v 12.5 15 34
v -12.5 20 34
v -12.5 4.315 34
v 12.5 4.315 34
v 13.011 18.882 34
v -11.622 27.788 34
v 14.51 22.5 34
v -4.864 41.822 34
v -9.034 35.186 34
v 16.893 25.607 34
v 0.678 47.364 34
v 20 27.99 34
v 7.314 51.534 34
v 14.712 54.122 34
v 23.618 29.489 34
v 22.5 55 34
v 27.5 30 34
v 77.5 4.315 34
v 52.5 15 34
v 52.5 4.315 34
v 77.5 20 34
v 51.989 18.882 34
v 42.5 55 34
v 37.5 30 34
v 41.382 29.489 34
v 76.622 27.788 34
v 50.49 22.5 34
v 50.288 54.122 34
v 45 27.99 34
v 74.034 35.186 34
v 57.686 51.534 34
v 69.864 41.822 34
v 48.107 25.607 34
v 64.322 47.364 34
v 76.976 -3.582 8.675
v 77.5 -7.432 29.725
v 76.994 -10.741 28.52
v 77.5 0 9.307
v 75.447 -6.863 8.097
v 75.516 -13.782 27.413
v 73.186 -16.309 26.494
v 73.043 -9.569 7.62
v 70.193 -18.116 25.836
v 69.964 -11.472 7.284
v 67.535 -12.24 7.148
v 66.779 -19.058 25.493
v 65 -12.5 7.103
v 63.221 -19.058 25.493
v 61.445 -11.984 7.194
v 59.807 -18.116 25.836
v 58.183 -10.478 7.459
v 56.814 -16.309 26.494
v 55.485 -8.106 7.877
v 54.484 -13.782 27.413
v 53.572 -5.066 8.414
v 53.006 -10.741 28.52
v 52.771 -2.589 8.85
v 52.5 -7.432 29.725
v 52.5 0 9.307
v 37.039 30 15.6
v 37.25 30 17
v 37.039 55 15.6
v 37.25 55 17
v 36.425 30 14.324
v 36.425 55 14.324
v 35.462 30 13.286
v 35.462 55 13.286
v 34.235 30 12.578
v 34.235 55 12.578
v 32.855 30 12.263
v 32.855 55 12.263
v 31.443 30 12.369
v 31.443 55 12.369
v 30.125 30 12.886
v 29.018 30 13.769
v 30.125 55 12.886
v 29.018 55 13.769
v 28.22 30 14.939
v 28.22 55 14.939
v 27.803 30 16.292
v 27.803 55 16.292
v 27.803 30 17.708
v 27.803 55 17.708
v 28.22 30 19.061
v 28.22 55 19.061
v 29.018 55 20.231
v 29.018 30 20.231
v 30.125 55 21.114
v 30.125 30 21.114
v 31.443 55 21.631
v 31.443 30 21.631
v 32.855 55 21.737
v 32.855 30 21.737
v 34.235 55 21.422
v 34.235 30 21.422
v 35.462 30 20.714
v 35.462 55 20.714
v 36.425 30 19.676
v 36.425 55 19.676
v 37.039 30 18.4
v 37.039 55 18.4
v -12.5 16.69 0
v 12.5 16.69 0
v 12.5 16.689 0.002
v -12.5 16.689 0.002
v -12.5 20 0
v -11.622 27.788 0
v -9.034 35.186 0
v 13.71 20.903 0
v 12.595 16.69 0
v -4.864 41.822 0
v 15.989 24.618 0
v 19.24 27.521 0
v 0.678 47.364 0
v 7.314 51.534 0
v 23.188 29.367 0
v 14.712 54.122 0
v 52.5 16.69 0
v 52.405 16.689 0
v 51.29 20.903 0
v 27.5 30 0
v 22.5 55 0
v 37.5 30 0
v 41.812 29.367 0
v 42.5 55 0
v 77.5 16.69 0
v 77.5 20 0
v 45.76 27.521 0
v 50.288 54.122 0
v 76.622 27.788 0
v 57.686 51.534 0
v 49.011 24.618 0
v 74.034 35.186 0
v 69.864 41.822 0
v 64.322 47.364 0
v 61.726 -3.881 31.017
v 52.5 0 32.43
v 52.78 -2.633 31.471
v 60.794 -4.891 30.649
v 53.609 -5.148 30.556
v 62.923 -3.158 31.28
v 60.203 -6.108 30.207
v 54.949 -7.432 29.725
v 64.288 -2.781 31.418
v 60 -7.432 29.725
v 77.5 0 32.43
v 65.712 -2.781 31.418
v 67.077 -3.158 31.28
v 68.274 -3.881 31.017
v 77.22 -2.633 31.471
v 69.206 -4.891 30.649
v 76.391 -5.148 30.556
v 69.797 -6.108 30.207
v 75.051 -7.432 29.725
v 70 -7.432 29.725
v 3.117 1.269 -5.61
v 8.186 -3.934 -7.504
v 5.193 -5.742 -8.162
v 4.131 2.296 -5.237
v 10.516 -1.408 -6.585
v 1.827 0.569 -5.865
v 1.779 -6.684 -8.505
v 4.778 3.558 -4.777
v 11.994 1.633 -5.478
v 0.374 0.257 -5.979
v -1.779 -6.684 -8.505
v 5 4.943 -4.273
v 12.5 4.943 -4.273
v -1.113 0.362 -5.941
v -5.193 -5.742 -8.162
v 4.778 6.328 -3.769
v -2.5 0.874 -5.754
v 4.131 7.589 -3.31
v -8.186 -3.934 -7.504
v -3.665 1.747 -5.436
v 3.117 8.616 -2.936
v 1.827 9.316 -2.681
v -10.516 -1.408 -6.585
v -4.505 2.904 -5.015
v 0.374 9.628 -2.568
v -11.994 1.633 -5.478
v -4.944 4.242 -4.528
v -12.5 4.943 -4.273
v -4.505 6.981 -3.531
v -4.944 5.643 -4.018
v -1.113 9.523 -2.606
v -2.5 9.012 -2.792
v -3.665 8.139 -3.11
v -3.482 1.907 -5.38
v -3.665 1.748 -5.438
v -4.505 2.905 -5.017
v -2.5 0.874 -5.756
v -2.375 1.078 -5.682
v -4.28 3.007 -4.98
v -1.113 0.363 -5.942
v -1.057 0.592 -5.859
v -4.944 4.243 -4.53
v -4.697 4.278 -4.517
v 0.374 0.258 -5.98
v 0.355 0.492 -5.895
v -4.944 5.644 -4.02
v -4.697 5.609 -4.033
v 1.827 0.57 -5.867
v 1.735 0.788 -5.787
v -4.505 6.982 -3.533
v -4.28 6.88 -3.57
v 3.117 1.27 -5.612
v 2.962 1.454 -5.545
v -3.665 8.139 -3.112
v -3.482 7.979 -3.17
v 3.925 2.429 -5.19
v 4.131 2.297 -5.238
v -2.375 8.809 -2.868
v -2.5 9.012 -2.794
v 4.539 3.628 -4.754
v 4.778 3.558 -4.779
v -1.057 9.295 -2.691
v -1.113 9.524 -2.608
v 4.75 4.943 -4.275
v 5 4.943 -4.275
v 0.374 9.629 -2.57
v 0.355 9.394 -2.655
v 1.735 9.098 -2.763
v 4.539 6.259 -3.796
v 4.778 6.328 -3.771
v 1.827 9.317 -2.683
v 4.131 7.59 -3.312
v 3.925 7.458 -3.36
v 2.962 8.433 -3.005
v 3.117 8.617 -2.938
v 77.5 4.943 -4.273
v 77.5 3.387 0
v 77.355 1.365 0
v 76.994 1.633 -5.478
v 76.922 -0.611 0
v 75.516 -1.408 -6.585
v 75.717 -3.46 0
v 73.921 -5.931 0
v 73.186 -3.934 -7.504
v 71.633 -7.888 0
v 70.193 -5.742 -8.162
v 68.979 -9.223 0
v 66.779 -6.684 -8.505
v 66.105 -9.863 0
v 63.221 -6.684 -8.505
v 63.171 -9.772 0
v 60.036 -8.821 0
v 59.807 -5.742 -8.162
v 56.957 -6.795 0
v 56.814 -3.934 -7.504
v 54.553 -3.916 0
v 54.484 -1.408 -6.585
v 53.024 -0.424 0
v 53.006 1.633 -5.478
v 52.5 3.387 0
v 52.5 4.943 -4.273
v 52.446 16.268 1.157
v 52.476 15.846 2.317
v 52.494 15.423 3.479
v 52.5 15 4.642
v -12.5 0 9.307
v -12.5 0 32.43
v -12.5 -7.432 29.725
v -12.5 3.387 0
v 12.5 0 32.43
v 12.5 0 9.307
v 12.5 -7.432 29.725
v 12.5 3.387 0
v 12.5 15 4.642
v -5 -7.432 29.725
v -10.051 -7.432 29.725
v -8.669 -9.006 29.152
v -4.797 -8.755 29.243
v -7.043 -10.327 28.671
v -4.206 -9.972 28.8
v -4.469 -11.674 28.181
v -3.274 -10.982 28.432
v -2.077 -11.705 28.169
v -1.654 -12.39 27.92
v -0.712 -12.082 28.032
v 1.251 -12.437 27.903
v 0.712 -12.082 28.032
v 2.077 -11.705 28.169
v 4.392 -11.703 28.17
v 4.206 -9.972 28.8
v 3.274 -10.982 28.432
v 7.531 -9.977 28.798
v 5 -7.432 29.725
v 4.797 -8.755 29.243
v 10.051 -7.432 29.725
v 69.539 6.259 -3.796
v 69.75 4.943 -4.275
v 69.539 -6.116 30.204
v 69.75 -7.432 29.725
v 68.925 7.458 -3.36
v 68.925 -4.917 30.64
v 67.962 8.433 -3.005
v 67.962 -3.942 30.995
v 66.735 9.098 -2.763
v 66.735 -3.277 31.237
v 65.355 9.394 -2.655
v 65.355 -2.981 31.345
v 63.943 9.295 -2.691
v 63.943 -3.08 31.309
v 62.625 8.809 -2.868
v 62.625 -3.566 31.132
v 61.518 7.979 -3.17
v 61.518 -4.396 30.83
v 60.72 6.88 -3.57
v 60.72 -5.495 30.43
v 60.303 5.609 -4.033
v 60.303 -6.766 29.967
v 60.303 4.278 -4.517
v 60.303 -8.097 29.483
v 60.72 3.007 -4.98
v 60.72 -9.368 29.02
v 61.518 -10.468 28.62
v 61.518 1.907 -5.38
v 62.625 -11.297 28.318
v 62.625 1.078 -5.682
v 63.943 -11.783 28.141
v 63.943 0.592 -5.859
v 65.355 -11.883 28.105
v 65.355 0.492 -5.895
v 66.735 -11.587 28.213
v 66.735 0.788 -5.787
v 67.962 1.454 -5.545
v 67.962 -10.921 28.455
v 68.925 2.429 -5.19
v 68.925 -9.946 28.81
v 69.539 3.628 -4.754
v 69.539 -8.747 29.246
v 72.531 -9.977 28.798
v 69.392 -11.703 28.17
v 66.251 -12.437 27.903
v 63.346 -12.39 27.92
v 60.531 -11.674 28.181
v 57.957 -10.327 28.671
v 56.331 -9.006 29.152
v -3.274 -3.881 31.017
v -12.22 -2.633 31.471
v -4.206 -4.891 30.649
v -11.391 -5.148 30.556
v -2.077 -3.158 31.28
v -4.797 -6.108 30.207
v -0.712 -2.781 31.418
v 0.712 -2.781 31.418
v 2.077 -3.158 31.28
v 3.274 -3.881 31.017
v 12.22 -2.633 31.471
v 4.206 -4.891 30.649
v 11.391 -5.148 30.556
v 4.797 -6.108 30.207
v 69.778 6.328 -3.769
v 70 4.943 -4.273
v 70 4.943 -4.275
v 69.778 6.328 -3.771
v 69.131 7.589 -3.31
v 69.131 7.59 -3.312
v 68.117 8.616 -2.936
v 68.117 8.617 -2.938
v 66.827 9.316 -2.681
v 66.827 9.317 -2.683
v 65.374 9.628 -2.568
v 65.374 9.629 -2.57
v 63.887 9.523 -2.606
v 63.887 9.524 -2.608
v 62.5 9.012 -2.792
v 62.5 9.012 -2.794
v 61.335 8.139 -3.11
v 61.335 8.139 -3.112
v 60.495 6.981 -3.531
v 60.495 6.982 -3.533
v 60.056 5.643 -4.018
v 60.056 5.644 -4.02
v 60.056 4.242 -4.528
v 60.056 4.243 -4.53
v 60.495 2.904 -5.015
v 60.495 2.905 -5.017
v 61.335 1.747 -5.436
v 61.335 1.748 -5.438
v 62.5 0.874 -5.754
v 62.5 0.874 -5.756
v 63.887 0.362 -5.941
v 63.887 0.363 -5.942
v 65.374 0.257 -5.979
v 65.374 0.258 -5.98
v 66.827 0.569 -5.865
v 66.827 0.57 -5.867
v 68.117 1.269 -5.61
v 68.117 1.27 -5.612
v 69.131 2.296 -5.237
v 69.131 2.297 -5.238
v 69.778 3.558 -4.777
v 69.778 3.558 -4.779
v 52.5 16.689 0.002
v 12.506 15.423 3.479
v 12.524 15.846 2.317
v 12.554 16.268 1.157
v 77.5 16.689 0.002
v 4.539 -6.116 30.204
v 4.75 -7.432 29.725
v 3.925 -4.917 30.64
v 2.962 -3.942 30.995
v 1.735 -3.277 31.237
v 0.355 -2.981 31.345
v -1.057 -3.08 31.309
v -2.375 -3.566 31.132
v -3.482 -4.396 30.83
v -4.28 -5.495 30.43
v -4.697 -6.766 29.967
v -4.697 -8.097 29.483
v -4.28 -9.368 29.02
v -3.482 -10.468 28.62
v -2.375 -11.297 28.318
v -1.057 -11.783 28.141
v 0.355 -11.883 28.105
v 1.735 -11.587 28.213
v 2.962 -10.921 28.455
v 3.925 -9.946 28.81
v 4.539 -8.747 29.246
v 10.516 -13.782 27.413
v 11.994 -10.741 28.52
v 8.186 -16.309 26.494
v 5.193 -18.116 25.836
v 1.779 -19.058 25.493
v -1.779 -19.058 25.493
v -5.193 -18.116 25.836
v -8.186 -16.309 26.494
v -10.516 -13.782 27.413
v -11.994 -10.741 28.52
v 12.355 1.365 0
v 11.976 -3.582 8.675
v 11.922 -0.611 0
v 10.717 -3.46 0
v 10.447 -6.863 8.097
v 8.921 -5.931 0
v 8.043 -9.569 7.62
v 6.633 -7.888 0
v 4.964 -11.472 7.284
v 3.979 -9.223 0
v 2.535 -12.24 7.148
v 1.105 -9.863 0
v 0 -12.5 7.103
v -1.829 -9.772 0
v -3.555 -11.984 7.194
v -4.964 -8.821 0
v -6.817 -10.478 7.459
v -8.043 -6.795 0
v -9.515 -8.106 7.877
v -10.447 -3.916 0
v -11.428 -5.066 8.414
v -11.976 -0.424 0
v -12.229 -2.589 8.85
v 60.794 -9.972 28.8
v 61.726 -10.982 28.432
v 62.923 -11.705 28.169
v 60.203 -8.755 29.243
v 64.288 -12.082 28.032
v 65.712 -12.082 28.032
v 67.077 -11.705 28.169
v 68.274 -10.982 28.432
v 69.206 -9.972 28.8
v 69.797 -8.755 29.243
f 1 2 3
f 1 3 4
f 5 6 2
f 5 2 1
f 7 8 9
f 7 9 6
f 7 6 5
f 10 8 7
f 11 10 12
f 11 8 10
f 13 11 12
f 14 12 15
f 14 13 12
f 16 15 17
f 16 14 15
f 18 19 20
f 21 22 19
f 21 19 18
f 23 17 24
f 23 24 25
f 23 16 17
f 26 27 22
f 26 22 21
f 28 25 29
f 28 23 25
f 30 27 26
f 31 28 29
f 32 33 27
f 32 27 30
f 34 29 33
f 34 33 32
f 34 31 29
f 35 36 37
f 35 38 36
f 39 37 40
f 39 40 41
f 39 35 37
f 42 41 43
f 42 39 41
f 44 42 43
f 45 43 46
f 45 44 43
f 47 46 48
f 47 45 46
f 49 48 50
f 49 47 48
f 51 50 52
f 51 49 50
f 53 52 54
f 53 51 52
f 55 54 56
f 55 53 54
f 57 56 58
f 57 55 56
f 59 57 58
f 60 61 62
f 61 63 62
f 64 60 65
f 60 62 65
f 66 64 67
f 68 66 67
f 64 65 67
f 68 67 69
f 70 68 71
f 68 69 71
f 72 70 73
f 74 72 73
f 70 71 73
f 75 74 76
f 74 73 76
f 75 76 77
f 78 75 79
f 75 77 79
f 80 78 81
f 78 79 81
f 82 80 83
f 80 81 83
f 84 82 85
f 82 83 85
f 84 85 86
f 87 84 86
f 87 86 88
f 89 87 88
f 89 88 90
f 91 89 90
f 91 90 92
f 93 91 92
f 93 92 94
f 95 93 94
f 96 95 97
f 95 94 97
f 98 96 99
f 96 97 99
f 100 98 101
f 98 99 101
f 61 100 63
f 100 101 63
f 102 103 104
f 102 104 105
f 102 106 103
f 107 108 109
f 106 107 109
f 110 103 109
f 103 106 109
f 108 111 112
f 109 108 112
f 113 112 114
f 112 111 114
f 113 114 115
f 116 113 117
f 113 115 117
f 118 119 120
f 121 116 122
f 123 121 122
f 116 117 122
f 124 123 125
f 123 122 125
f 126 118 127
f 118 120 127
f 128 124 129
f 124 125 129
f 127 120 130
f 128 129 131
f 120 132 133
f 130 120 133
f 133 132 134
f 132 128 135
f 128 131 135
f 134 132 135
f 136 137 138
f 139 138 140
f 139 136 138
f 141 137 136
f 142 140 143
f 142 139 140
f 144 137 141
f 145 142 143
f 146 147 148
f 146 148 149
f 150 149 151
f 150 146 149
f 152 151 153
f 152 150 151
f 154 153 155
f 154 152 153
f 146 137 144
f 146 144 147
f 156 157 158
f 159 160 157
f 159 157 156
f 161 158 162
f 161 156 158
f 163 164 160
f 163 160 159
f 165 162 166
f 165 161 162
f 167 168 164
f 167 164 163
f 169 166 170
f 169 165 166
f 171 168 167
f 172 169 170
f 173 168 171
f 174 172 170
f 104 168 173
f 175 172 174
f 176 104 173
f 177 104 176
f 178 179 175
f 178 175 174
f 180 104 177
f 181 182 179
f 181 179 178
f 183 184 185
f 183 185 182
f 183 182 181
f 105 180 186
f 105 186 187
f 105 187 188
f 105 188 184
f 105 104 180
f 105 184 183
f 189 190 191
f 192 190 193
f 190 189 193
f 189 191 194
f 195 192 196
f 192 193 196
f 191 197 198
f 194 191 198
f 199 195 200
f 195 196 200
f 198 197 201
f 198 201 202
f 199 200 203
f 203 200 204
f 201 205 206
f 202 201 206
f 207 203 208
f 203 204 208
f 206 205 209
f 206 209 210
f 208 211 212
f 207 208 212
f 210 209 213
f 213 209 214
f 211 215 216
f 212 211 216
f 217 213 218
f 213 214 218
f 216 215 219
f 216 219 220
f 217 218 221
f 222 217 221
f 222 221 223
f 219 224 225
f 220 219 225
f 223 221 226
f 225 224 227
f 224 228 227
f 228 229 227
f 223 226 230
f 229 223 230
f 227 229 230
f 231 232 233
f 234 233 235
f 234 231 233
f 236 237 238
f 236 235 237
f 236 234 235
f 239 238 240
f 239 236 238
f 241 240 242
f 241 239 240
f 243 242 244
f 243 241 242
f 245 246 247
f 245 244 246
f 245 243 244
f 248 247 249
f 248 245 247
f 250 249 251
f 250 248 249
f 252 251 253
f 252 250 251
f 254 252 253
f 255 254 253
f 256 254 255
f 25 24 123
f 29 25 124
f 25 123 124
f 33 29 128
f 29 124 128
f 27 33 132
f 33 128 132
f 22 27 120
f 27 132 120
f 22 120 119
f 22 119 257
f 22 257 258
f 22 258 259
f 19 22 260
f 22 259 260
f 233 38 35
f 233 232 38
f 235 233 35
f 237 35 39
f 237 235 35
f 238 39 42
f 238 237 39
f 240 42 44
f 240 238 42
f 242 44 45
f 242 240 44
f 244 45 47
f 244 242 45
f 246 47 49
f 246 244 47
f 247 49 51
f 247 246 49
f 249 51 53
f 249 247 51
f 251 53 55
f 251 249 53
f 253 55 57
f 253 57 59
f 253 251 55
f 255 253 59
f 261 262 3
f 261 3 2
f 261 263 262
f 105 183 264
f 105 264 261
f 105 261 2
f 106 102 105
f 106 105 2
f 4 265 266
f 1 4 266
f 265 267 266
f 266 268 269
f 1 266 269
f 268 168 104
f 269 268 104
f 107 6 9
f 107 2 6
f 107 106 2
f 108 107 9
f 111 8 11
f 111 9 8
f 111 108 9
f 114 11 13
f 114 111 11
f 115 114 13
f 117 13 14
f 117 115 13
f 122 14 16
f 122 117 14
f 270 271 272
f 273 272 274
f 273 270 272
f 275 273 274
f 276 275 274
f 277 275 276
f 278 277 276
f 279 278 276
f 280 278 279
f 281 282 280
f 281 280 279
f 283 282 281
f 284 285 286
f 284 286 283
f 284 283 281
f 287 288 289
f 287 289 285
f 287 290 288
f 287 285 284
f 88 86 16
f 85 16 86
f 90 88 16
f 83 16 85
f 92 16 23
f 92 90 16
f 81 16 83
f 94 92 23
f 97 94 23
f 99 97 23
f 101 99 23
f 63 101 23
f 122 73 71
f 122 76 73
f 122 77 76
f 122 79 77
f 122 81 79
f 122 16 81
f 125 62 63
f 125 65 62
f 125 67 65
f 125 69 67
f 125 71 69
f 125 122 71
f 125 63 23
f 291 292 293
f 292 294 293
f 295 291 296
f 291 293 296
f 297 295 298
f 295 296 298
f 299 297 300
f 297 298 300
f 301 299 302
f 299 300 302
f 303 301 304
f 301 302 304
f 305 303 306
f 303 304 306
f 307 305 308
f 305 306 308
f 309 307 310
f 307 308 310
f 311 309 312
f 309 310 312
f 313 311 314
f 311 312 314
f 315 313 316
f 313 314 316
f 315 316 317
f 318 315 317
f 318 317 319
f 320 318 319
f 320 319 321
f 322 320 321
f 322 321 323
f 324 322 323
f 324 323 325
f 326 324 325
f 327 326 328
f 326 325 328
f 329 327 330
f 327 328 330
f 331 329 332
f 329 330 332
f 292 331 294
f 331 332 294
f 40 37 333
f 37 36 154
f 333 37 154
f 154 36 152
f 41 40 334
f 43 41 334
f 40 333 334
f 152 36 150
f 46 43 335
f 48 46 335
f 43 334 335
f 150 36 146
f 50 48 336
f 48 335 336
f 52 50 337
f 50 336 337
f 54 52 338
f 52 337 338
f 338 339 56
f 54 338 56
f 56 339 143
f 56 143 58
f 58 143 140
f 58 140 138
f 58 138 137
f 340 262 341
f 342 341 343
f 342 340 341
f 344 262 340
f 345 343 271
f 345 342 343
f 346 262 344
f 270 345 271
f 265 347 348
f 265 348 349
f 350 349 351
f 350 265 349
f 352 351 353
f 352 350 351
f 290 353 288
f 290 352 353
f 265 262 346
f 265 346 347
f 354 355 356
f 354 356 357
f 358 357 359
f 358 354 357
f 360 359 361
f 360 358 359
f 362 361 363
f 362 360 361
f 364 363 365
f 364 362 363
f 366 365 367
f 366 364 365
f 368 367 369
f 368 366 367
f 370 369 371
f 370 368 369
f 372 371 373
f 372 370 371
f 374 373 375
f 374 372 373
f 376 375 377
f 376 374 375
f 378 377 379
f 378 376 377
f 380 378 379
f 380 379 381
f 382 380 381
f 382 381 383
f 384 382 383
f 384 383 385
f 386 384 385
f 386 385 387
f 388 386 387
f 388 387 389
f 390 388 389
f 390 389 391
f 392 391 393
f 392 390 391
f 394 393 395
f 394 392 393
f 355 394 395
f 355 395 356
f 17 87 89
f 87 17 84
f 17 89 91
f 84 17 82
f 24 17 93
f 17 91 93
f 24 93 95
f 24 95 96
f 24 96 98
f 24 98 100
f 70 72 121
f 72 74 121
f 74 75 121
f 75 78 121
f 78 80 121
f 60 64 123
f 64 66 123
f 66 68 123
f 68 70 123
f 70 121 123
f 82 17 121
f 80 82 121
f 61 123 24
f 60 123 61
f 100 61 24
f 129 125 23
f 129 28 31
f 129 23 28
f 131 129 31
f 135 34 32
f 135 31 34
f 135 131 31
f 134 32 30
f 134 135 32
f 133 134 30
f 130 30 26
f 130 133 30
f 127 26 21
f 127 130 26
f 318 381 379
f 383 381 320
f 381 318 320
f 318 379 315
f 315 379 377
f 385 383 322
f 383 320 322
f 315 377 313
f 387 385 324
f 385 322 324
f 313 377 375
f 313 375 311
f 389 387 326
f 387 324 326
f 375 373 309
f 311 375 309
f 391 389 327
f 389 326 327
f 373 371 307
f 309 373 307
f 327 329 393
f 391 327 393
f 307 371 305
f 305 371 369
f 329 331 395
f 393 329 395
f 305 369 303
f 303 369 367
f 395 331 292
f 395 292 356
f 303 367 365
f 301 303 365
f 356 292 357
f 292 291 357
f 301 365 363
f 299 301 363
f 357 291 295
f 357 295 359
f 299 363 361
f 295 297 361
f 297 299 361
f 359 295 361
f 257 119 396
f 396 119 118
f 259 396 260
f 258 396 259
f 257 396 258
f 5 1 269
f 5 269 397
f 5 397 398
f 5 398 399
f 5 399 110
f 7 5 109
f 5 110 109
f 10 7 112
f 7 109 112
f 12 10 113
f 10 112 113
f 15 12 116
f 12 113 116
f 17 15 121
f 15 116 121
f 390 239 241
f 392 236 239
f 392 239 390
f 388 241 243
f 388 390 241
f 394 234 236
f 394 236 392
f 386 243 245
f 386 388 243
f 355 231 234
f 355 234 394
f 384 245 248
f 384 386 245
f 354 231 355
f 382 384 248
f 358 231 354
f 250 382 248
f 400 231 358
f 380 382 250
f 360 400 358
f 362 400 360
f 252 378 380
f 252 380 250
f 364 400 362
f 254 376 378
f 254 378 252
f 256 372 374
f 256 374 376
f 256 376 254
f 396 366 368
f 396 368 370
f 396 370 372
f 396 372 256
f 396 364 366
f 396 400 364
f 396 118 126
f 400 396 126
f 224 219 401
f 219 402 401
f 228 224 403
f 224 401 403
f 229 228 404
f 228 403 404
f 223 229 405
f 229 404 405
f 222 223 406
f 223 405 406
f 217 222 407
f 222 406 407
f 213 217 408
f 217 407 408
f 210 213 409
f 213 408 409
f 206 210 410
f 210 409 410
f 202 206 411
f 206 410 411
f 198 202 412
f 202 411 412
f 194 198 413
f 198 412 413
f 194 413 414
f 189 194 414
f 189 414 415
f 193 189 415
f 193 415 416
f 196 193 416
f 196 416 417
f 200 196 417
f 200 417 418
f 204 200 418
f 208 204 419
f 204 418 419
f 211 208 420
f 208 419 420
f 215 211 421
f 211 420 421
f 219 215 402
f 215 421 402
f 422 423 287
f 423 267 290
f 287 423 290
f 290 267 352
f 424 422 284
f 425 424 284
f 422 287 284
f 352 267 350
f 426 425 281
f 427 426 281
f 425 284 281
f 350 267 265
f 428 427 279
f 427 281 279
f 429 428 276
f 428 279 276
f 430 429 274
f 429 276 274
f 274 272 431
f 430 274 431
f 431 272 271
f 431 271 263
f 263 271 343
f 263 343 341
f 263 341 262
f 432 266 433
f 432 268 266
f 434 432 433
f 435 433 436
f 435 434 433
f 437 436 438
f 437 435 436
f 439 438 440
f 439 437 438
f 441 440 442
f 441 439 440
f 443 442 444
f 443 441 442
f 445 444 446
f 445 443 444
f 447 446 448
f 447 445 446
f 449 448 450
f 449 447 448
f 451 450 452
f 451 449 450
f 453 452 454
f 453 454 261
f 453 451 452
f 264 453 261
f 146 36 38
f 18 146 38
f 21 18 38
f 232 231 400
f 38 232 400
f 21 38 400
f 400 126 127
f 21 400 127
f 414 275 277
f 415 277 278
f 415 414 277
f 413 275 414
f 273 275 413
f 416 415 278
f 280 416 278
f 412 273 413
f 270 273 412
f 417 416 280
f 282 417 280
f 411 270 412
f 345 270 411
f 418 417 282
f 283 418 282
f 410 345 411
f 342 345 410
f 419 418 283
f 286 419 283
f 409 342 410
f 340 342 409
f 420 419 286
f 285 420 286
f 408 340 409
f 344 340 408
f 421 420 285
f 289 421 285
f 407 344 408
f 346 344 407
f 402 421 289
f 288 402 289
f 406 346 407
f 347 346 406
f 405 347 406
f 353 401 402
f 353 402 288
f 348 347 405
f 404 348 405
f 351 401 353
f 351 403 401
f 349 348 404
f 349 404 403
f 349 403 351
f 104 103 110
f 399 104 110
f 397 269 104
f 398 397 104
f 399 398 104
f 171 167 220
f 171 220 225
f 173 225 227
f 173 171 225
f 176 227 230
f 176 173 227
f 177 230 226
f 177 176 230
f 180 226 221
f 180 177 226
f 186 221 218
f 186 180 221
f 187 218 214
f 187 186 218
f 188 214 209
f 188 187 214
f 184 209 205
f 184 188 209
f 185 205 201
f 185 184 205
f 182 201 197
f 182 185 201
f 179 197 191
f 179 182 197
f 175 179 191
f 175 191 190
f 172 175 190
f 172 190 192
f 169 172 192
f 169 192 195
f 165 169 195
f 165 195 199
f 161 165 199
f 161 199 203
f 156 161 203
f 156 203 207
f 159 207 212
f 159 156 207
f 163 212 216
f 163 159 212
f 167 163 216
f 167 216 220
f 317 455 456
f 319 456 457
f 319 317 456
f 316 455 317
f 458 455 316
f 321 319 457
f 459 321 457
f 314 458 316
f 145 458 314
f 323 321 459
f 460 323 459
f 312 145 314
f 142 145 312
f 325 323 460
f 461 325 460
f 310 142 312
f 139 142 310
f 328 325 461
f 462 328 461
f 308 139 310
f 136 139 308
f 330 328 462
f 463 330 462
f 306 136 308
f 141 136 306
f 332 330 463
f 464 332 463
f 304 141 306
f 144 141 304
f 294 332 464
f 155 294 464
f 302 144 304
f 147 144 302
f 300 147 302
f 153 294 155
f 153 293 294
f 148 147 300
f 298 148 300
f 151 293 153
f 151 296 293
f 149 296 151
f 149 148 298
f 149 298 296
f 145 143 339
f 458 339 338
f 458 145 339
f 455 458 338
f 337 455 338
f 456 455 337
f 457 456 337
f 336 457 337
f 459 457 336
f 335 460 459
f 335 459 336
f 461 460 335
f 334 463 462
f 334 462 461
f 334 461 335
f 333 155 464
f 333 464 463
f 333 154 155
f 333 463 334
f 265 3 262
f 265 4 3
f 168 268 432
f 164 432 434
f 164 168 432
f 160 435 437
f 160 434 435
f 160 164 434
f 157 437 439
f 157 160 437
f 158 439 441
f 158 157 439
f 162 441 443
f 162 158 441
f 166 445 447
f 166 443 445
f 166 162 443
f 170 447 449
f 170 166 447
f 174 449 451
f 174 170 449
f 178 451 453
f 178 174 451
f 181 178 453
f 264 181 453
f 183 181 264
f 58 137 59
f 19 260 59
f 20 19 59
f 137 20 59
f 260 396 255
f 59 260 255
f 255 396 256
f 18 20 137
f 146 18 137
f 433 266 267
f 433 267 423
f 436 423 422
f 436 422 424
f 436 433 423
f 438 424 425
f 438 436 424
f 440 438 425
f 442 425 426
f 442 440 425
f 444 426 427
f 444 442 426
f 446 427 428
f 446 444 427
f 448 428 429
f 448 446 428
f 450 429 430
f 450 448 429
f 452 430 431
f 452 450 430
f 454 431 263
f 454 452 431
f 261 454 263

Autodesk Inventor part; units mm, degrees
ref_plane "YZ Plane" through (0, 0, 0) normal (1, 0, 0) x (0, 1, 0)
ref_plane "XZ Plane" through (0, 0, 0) normal (0, 1, 0) x (-1, 0, 0)
sketch "Sketch1" plane through (0, 0, 0) normal (0, 0, 1) x (1, 0, 0)
  circle A0 centre (0, 0) radius 5
  circle A1 centre (65, 0) radius 5
  circle A2 centre (0, 0) radius 12.5
  circle A3 centre (65, 0) radius 12.5
  line L0 (22.5, 9.5) -> (42.5, 9.5)
  line L1 (42.5, 9.5) -> (42.5, -10.5)
  line L2 (42.5, -10.5) -> (22.5, -10.5)
  line L3 (22.5, -10.5) -> (22.5, 9.5)
  line L4 (0, 0) -> (65, 0) construction
  line L5 (32.5, 0) -> (32.5, 30) construction
  line L6 (27.5, 30) -> (37.5, 30)
  line L7 (12.5, 0) -> (12.5, 15)
  line L8 (52.5, 0) -> (52.5, 15)
  arc A4 (27.5, 30) -> (12.5, 15) centre (27.5, 15) ccw
  arc A5 (52.5, 15) -> (37.5, 30) centre (37.5, 15) ccw
  line L9 (-12.5, 0) -> (-12.5, 20)
  line L10 (77.5, 0) -> (77.5, 20)
  line L11 (22.5, 55) -> (42.5, 55)
  arc A6 (22.5, 55) -> (-12.5, 20) centre (22.5, 20) ccw
  arc A7 (77.5, 20) -> (42.5, 55) centre (42.5, 20) ccw
  point P0 (22.5, 30)
  point P1 (42.5, 30)
  dimension "d0" = 10
  dimension "d1" = 10
  dimension "d2" = 65
  dimension "d3" = 25
  dimension "d4" = 25
  dimension "d5" = 22.5
  dimension "d6" = 22.5
  dimension "d7" = 9.5
  dimension "d8" = 10.5
  dimension "d11" = 20
  dimension "d12" = 10
  dimension "d13" = 30
  dimension "d14" = 15
  dimension "d15" = 55
  dimension "d16" = 35
extrude "Extrusion1" add sketch "Sketch1" along normal blind 34 contours A0 | A1 | A2 | A2 L9 A6 L11 A7 L10 A3 L8 A5 L6 A4 L7 | A3
ref_plane "Work Plane4" through (42.5, 55, 0) normal (0, 0.3420201, -0.9396926) x (-1, 0, 0)
sketch "Sketch23" plane through (42.5, 55, 0) normal (0, 0.3420201, -0.9396926) x (-1, 0, 0)
  ellipse E0 centre (42.5, -40.0544) end of major axis (30, -40.0544) minor radius 11.7462 (30, -40.0544) -> (55, -40.0544) ccw projected
  line L0 (30, -40.0544) -> (30, -25.959) projected
  ellipse E1 centre (15, -25.959) end of major axis (30, -25.959) minor radius 14.0954 (30, -25.959) -> (15, -11.8636) ccw projected
  line L1 (15, -11.8636) -> (5, -11.8636) projected
  ellipse E2 centre (5, -25.959) end of major axis (20, -25.959) minor radius 14.0954 (5, -11.8636) -> (-10, -25.959) ccw projected
  line L2 (-10, -25.959) -> (-10, -40.0544) projected
  ellipse E3 centre (-22.5, -40.0544) end of major axis (-35, -40.0544) minor radius 11.7462 (-35, -40.0544) -> (-10, -40.0544) ccw projected
  line L3 (-35, -40.0544) -> (-35, -21.2606) projected
  ellipse E4 centre (0, -21.2606) end of major axis (-35, -21.2606) minor radius 32.8892 (0, 11.6287) -> (-35, -21.2606) ccw projected
  line L4 (0, 11.6287) -> (20, 11.6287) projected
  ellipse E5 centre (20, -21.2606) end of major axis (55, -21.2606) minor radius 32.8892 (55, -21.2606) -> (20, 11.6287) ccw projected
  line L5 (55, -21.2606) -> (55, -40.0544) projected
  ellipse E6 centre (42.5, -51.6831) end of major axis (30, -51.6831) minor radius 11.7462 (30, -51.6831) -> (55, -51.6831) ccw projected
  line L6 (55, -32.8892) -> (55, -51.6831) projected
  ellipse E7 centre (20, -32.8892) end of major axis (55, -32.8892) minor radius 32.8892 (55, -32.8892) -> (20, 0) ccw projected
  line L7 (0, 0) -> (20, 0) projected
  ellipse E8 centre (0, -32.8892) end of major axis (-35, -32.8892) minor radius 32.8892 (0, 0) -> (-35, -32.8892) ccw projected
  line L8 (-35, -51.6831) -> (-35, -32.8892) projected
  ellipse E9 centre (-22.5, -51.6831) end of major axis (-35, -51.6831) minor radius 11.7462 (-35, -51.6831) -> (-10, -51.6831) ccw projected
  line L9 (-10, -37.5877) -> (-10, -51.6831) projected
  ellipse E10 centre (5, -37.5877) end of major axis (20, -37.5877) minor radius 14.0954 (5, -23.4923) -> (-10, -37.5877) ccw projected
  line L10 (15, -23.4923) -> (5, -23.4923) projected
  ellipse E11 centre (15, -37.5877) end of major axis (30, -37.5877) minor radius 14.0954 (30, -37.5877) -> (15, -23.4923) ccw projected
  line L11 (30, -51.6831) -> (30, -37.5877) projected
  line L12 (0, 0) -> (20, 0) projected
  line L13 (10, 0) -> (10, -36)
  circle A0 centre (-22.5, -48.5) radius 5
  circle A1 centre (42.5, -48.5) radius 5
  circle A2 centre (-22.5, -48.5) radius 12.5
  circle A3 centre (42.5, -48.5) radius 12.5
  line L14 (-35, -36) -> (-10, -36)
  line L15 (-35, -36) -> (-35, -48.5)
  line L16 (-35, -51.6831) -> (-35, -40.0544) projected
  line L17 (-10, -36) -> (-10, -48.5)
  line L18 (-10, -51.6831) -> (-10, -40.0544) projected
  line L19 (30, -36) -> (55, -36)
  line L20 (30, -51.6831) -> (30, -40.0544) projected
  line L21 (30, -48.5) -> (30, -36)
  line L22 (55, -48.5) -> (55, -36)
  dimension "d108" = 36
  dimension "d110" = 10
  dimension "d111" = 10
  dimension "d112" = 12.5
  dimension "d113" = 12.5
  dimension "d114" = 25
  dimension "d115" = 25
extrude "Extrusion29" add sketch "Sketch23" against normal blind 49.285 contours L0 L19 A3 E0 | E0 A3 L11 | A3 E0 A1 | E0 A1 A3 | L19 L5 E0 A3 | A3 E0 L6 | L2 E3 A2 L14 | L9 A2 E3 | A2 E3 A0 | A2 E3 L3 L14 | A2 E3 A0 | A2 L8 E3
sketch "Sketch24" plane through (42.5, 55, 0) normal (0, 0.3420201, -0.9396926) x (-1, 0, 0)
  circle A0 centre (-22.5, -48.5) radius 5 projected
  arc A1 (-35, -48.5) -> (-10, -48.5) centre (-22.5, -48.5) ccw projected
  line L0 (-10, -48.5) -> (-10, -36) projected
  line L1 (-10, -36) -> (-35, -36) projected
  line L2 (-35, -36) -> (-35, -48.5) projected
  circle A2 centre (42.5, -48.5) radius 5 projected
  arc A3 (30, -48.5) -> (55, -48.5) centre (42.5, -48.5) ccw projected
  line L3 (55, -48.5) -> (55, -36) projected
  line L4 (30, -36) -> (55, -36) projected
  line L5 (30, -36) -> (30, -48.5) projected
  point P0 (42.5, -51.6831)
extrude "Extrusion30" cut sketch "Sketch24" against normal blind 13.103
sketch "Sketch25" plane through (77.5, 20, 34) normal (1, 0, 0) x (0, 0, -1)
  line L0 (1.5704, -20) -> (1.5704, -20) projected
  line L1 (1.5704, -20) -> (4.2752, -27.4316) projected
  line L2 (4.2752, -27.4316) -> (4.2752, -27.4316) projected
  line L3 (4.2752, -27.4316) -> (1.5704, -20) projected
  line L4 (-2.4671, -8.9071) -> (10.0523, -43.304)
  line L5 (10.0523, -43.304) -> (-2.0937, -47.7247)
  line L6 (-2.4671, -8.9071) -> (-14.6131, -13.3279)
  line L7 (-2.0937, -47.7247) -> (-14.6131, -13.3279)
  point P0 (34, -20)
extrude "Extrusion31" cut sketch "Sketch25" against normal blind 100
sketch "Sketch26" plane through (42.5, 50.5185, 12.3128) normal (0, 0.3420201, -0.9396926) x (-1, 0, 0)
  circle A0 centre (-22.5, -48.5) radius 5 projected
  arc A1 (-35, -48.5) -> (-10, -48.5) centre (-22.5, -48.5) ccw projected
  line L0 (-10, -36.0002) -> (-10, -48.5) projected
  line L1 (-10, -36) -> (-10, -36.0002) projected
  line L2 (-35, -36) -> (-10, -36) projected
  line L3 (-35, -48.5) -> (-35, -36) projected
  circle A2 centre (42.5, -48.5) radius 5 projected
  arc A3 (30, -48.5) -> (55, -48.5) centre (42.5, -48.5) ccw projected
  line L4 (55, -36) -> (55, -48.5) projected
  line L5 (30, -36) -> (55, -36) projected
  line L6 (30, -36.0002) -> (30, -36) projected
  line L7 (30, -48.5) -> (30, -36.0002) projected
  line L8 (-35, -36) -> (-43.7615, -36)
  line L9 (-43.7615, -36) -> (-43.7615, -67.4165)
  line L10 (-43.7615, -67.4165) -> (-2.78, -67.4165)
  line L11 (-2.78, -67.4165) -> (-2.78, -36)
  line L12 (-2.78, -36) -> (-10, -36)
  line L13 (30, -36.0002) -> (23.7348, -36)
  line L14 (23.7348, -36) -> (23.7338, -67.4165)
  line L15 (23.7338, -67.4165) -> (61.4136, -67.4165)
  line L16 (61.4136, -67.4165) -> (61.4136, -36.0012)
  line L17 (61.4136, -36.0012) -> (55, -36)
  point P0 (42.5, -51.6831)
extrude "Extrusion32" cut sketch "Sketch26" against normal blind 100 contours A0 | A1 L0 L12 L11 L10 L9 L8 L3 | A2 | A3 L4 L17 L16 L15 L14 L13 L7
sketch "Sketch27" plane through (22.5, 55, 0) normal (0, 1, 0) x (1, 0, 0)
  circle A0 centre (10, -17) radius 5
  line L0 (20, 0) -> (0, 0) projected
  line L1 (0, 0) -> (0, -34) projected
  line L2 (20, -34) -> (0, -34) projected
  line L3 (20, 0) -> (20, -34) projected
  point P0 (-22.5, 0)
  dimension "d124" = 10
  dimension "d125" = 20
  dimension "d126" = 34
  dimension "d127" = 10
  dimension "d128" = 17
extrude "Extrusion33" cut sketch "Sketch27" against normal blind 100 contours A0
sketch "Sketch28" plane through (42.5, 38.1435, 46.3128) normal (0, -0.3420201, 0.9396926) x (1, 0, 0)
  circle A0 centre (-42.5, -48.5) radius 5 projected
  line L0 (-55, -48.5) -> (-55, -36) projected
  arc A1 (-55, -48.5) -> (-30, -48.5) centre (-42.5, -48.5) ccw projected
  line L1 (-30, -36) -> (-30, -48.5) projected
  line L2 (-55, -36) -> (-30, -36) projected
  circle A2 centre (22.5, -48.5) radius 5 projected
  line L3 (35, -36) -> (35, -48.5) projected
  line L4 (35, -36) -> (10, -36) projected
  line L5 (10, -48.5) -> (10, -36) projected
  arc A3 (10, -48.5) -> (35, -48.5) centre (22.5, -48.5) ccw projected
  circle A4 centre (22.5, -48.5) radius 4.75
  circle A5 centre (22.5, -48.5) radius 5
  circle A6 centre (-42.5, -48.5) radius 5
  circle A7 centre (-42.5, -48.5) radius 4.75
  point P0 (-42.5, -51.6831)
  dimension "d131" = 9.5
  dimension "d132" = 9.5
extrude "Extrusion34" add sketch "Sketch28" against normal up to surface (36.182 mm away) contours A0 | A2
sketch "Sketch29" plane through (22.5, 55, 0) normal (0, 1, 0) x (1, 0, 0)
  circle A0 centre (10, -17) radius 5 projected
  line L0 (20, 0) -> (0, 0) projected
  line L1 (0, 0) -> (0, -34) projected
  line L2 (20, -34) -> (0, -34) projected
  line L3 (20, 0) -> (20, -34) projected
  circle A1 centre (10, -17) radius 4.75
  point P0 (-22.5, 0)
  dimension "d135" = 9.5
extrude "Extrusion35" add sketch "Sketch29" against normal up to surface (25 mm away) contours A0
equation "\"d12\" = 0.5 * d11"
equation "\"d15\" = d13 + d3"
properties part number "MountB"
